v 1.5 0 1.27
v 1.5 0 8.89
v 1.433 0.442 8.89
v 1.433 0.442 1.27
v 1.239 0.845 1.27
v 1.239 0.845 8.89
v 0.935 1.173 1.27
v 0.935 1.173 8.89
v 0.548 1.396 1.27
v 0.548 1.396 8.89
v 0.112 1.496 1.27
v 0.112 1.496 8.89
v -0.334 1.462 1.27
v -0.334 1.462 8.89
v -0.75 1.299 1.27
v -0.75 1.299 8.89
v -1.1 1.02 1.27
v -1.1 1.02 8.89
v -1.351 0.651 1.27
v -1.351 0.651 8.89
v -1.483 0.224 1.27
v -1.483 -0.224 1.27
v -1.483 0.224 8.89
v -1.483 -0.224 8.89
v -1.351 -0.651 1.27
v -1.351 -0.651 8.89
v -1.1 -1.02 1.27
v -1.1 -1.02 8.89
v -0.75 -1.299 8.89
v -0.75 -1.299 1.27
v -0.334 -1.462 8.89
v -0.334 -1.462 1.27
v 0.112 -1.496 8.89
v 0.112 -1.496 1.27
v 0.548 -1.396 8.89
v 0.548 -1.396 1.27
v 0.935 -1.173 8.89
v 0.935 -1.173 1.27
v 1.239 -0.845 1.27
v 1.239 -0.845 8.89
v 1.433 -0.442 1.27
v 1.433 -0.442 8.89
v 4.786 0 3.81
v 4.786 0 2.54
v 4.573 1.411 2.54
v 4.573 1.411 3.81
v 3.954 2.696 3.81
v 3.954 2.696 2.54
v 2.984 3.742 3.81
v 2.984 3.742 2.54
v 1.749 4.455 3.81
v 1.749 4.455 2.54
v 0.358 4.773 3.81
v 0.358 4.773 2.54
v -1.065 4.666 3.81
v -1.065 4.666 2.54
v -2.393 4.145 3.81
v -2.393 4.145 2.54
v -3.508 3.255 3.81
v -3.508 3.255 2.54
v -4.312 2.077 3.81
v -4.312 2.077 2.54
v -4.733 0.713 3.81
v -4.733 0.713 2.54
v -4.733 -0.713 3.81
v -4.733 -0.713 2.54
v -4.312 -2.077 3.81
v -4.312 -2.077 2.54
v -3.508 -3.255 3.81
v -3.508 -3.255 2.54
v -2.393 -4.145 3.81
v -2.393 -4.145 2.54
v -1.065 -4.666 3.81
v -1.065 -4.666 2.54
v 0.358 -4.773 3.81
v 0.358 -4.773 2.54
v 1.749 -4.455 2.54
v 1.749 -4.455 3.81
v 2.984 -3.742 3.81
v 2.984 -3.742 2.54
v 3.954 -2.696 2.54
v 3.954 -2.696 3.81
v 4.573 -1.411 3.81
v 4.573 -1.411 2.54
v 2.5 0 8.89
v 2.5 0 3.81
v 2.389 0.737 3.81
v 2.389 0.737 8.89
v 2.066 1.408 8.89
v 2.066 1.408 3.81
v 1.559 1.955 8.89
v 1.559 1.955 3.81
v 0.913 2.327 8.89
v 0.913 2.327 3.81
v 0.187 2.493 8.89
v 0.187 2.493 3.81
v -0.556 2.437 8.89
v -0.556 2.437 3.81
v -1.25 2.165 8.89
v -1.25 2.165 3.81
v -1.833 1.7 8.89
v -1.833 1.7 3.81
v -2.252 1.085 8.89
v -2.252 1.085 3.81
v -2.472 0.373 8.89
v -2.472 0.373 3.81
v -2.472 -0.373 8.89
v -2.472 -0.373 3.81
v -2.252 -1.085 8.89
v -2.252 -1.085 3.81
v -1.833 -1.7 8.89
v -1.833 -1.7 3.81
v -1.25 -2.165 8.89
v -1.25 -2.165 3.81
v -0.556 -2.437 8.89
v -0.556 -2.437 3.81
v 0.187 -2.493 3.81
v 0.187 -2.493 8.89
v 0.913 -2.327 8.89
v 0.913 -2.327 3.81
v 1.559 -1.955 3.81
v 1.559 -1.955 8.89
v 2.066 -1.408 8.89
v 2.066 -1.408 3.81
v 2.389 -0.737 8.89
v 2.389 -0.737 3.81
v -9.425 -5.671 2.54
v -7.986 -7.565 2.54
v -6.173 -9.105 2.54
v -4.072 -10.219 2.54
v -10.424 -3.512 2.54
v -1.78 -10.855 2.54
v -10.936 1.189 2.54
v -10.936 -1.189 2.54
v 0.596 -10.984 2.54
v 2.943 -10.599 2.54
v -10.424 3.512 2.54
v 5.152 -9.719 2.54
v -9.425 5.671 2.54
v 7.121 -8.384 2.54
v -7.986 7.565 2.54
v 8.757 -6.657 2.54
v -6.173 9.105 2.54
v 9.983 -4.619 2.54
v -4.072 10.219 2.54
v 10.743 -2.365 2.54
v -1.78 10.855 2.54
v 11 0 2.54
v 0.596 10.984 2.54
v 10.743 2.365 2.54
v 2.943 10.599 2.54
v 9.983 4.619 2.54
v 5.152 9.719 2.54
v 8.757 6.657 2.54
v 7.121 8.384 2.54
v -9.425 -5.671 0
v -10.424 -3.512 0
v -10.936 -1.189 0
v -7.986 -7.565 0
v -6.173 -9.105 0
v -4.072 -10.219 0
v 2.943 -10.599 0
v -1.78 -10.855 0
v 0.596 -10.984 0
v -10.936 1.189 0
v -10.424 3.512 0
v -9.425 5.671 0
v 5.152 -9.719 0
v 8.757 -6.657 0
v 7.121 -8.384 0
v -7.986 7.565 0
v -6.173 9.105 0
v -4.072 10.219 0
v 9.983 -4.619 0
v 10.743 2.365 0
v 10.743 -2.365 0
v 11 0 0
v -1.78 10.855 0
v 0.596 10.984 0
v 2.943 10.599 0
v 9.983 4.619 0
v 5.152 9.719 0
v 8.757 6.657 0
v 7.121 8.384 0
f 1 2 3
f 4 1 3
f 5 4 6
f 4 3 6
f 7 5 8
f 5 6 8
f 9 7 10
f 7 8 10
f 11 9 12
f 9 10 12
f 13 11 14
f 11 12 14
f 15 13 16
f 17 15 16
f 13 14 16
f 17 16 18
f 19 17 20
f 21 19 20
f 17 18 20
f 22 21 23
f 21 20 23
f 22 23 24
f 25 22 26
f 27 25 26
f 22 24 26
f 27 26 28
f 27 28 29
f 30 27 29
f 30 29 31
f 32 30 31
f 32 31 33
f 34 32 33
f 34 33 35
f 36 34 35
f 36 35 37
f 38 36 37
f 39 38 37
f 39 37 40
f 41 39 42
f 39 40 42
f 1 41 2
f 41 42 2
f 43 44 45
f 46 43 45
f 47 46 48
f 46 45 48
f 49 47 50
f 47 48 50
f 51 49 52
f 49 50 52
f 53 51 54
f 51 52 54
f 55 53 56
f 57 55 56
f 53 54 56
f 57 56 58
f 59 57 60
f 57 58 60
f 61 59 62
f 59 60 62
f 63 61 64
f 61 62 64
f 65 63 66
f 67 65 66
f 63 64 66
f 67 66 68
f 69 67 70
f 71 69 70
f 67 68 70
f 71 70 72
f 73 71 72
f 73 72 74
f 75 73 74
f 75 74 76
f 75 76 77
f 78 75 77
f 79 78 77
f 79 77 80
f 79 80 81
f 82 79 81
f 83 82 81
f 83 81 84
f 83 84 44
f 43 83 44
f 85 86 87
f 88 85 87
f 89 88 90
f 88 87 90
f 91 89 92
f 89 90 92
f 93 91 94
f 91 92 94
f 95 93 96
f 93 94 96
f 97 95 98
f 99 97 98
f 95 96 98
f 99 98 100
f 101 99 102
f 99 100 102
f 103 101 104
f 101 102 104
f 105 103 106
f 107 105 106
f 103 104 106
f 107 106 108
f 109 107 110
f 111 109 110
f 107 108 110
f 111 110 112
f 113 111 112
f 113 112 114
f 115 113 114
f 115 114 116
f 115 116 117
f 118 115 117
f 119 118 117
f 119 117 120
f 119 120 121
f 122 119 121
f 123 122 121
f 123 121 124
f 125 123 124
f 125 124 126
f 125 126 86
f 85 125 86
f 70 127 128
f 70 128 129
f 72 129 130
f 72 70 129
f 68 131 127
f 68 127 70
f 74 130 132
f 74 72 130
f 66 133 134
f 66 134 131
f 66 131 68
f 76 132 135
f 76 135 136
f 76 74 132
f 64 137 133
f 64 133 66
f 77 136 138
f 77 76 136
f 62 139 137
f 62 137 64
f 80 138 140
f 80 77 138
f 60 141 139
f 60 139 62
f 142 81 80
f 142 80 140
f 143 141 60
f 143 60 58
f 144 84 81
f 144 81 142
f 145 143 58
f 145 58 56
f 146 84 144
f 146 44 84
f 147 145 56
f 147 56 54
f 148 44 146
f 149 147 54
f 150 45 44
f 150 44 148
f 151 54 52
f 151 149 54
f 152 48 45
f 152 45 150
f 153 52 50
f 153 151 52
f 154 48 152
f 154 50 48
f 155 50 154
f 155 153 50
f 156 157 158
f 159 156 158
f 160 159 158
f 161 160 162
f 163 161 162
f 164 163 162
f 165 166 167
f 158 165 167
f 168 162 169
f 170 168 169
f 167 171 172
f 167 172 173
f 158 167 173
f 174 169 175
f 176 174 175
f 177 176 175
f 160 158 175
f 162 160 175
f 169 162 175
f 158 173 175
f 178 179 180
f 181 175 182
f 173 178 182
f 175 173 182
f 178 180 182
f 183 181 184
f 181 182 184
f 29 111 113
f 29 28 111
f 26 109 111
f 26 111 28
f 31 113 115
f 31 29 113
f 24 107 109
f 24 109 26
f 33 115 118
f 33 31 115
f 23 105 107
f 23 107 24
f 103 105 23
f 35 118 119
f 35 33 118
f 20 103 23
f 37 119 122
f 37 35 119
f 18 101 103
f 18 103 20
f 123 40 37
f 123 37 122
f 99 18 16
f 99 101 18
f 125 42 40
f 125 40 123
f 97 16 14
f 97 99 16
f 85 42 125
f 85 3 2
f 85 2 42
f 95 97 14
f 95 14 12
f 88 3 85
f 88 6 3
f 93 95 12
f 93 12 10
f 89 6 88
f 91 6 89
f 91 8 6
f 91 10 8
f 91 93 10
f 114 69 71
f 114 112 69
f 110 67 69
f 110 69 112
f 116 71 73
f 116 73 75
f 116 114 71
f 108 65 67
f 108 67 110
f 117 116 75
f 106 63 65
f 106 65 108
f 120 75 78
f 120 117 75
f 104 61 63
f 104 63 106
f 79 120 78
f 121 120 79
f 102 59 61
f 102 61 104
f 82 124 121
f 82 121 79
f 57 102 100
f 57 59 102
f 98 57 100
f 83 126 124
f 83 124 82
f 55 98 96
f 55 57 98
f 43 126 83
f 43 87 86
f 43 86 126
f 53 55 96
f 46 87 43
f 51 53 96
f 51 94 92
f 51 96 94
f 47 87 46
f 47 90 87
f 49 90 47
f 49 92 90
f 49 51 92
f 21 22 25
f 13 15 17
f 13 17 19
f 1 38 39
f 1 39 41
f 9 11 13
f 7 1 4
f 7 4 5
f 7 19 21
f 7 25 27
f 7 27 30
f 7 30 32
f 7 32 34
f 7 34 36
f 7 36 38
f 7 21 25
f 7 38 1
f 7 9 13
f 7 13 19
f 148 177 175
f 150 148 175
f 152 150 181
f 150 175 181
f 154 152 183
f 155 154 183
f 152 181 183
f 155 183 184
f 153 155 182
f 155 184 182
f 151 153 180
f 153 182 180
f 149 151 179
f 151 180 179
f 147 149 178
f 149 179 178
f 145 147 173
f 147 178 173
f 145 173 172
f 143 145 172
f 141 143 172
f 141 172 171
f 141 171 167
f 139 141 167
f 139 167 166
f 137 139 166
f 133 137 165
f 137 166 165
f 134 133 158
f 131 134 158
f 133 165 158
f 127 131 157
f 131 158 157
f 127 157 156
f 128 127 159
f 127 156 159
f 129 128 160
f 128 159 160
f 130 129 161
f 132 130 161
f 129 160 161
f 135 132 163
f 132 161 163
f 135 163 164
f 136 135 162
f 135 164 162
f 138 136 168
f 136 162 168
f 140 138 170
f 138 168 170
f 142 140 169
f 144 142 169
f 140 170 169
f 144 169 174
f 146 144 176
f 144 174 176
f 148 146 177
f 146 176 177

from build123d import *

# Parameters (mm, degrees)
F0_R     = 2.5
F1_DEPTH = 8.89
F0_R_2   = 4.786
F2_DEPTH = 3.81
F0_R_3   = 11
F3_DEPTH = 2.54
F4_R     = 1.5
F5_DEPTH = 7.62


with BuildPart() as f1:
    # F0 (on Top) → F1 (new body)
    with BuildSketch(Plane.XY):
        Circle(F0_R)
    extrude(amount=F1_DEPTH)

    # F0 (on Top) → F2 (join)
    with BuildSketch(Plane.XY):
        Circle(F0_R_2)
        Circle(F0_R, mode=Mode.SUBTRACT)
    extrude(amount=F2_DEPTH)

    # F0 (on Top) → F3 (join)
    with BuildSketch(Plane.XY):
        Circle(F0_R_3)
        Circle(F0_R_2, mode=Mode.SUBTRACT)
    extrude(amount=F3_DEPTH)

    # F4 (on face) → F5 (cut)
    with BuildSketch(Plane.XY.offset(8.89)):
        Circle(F4_R)
    extrude(amount=-F5_DEPTH, mode=Mode.SUBTRACT)


solid = f1.part
